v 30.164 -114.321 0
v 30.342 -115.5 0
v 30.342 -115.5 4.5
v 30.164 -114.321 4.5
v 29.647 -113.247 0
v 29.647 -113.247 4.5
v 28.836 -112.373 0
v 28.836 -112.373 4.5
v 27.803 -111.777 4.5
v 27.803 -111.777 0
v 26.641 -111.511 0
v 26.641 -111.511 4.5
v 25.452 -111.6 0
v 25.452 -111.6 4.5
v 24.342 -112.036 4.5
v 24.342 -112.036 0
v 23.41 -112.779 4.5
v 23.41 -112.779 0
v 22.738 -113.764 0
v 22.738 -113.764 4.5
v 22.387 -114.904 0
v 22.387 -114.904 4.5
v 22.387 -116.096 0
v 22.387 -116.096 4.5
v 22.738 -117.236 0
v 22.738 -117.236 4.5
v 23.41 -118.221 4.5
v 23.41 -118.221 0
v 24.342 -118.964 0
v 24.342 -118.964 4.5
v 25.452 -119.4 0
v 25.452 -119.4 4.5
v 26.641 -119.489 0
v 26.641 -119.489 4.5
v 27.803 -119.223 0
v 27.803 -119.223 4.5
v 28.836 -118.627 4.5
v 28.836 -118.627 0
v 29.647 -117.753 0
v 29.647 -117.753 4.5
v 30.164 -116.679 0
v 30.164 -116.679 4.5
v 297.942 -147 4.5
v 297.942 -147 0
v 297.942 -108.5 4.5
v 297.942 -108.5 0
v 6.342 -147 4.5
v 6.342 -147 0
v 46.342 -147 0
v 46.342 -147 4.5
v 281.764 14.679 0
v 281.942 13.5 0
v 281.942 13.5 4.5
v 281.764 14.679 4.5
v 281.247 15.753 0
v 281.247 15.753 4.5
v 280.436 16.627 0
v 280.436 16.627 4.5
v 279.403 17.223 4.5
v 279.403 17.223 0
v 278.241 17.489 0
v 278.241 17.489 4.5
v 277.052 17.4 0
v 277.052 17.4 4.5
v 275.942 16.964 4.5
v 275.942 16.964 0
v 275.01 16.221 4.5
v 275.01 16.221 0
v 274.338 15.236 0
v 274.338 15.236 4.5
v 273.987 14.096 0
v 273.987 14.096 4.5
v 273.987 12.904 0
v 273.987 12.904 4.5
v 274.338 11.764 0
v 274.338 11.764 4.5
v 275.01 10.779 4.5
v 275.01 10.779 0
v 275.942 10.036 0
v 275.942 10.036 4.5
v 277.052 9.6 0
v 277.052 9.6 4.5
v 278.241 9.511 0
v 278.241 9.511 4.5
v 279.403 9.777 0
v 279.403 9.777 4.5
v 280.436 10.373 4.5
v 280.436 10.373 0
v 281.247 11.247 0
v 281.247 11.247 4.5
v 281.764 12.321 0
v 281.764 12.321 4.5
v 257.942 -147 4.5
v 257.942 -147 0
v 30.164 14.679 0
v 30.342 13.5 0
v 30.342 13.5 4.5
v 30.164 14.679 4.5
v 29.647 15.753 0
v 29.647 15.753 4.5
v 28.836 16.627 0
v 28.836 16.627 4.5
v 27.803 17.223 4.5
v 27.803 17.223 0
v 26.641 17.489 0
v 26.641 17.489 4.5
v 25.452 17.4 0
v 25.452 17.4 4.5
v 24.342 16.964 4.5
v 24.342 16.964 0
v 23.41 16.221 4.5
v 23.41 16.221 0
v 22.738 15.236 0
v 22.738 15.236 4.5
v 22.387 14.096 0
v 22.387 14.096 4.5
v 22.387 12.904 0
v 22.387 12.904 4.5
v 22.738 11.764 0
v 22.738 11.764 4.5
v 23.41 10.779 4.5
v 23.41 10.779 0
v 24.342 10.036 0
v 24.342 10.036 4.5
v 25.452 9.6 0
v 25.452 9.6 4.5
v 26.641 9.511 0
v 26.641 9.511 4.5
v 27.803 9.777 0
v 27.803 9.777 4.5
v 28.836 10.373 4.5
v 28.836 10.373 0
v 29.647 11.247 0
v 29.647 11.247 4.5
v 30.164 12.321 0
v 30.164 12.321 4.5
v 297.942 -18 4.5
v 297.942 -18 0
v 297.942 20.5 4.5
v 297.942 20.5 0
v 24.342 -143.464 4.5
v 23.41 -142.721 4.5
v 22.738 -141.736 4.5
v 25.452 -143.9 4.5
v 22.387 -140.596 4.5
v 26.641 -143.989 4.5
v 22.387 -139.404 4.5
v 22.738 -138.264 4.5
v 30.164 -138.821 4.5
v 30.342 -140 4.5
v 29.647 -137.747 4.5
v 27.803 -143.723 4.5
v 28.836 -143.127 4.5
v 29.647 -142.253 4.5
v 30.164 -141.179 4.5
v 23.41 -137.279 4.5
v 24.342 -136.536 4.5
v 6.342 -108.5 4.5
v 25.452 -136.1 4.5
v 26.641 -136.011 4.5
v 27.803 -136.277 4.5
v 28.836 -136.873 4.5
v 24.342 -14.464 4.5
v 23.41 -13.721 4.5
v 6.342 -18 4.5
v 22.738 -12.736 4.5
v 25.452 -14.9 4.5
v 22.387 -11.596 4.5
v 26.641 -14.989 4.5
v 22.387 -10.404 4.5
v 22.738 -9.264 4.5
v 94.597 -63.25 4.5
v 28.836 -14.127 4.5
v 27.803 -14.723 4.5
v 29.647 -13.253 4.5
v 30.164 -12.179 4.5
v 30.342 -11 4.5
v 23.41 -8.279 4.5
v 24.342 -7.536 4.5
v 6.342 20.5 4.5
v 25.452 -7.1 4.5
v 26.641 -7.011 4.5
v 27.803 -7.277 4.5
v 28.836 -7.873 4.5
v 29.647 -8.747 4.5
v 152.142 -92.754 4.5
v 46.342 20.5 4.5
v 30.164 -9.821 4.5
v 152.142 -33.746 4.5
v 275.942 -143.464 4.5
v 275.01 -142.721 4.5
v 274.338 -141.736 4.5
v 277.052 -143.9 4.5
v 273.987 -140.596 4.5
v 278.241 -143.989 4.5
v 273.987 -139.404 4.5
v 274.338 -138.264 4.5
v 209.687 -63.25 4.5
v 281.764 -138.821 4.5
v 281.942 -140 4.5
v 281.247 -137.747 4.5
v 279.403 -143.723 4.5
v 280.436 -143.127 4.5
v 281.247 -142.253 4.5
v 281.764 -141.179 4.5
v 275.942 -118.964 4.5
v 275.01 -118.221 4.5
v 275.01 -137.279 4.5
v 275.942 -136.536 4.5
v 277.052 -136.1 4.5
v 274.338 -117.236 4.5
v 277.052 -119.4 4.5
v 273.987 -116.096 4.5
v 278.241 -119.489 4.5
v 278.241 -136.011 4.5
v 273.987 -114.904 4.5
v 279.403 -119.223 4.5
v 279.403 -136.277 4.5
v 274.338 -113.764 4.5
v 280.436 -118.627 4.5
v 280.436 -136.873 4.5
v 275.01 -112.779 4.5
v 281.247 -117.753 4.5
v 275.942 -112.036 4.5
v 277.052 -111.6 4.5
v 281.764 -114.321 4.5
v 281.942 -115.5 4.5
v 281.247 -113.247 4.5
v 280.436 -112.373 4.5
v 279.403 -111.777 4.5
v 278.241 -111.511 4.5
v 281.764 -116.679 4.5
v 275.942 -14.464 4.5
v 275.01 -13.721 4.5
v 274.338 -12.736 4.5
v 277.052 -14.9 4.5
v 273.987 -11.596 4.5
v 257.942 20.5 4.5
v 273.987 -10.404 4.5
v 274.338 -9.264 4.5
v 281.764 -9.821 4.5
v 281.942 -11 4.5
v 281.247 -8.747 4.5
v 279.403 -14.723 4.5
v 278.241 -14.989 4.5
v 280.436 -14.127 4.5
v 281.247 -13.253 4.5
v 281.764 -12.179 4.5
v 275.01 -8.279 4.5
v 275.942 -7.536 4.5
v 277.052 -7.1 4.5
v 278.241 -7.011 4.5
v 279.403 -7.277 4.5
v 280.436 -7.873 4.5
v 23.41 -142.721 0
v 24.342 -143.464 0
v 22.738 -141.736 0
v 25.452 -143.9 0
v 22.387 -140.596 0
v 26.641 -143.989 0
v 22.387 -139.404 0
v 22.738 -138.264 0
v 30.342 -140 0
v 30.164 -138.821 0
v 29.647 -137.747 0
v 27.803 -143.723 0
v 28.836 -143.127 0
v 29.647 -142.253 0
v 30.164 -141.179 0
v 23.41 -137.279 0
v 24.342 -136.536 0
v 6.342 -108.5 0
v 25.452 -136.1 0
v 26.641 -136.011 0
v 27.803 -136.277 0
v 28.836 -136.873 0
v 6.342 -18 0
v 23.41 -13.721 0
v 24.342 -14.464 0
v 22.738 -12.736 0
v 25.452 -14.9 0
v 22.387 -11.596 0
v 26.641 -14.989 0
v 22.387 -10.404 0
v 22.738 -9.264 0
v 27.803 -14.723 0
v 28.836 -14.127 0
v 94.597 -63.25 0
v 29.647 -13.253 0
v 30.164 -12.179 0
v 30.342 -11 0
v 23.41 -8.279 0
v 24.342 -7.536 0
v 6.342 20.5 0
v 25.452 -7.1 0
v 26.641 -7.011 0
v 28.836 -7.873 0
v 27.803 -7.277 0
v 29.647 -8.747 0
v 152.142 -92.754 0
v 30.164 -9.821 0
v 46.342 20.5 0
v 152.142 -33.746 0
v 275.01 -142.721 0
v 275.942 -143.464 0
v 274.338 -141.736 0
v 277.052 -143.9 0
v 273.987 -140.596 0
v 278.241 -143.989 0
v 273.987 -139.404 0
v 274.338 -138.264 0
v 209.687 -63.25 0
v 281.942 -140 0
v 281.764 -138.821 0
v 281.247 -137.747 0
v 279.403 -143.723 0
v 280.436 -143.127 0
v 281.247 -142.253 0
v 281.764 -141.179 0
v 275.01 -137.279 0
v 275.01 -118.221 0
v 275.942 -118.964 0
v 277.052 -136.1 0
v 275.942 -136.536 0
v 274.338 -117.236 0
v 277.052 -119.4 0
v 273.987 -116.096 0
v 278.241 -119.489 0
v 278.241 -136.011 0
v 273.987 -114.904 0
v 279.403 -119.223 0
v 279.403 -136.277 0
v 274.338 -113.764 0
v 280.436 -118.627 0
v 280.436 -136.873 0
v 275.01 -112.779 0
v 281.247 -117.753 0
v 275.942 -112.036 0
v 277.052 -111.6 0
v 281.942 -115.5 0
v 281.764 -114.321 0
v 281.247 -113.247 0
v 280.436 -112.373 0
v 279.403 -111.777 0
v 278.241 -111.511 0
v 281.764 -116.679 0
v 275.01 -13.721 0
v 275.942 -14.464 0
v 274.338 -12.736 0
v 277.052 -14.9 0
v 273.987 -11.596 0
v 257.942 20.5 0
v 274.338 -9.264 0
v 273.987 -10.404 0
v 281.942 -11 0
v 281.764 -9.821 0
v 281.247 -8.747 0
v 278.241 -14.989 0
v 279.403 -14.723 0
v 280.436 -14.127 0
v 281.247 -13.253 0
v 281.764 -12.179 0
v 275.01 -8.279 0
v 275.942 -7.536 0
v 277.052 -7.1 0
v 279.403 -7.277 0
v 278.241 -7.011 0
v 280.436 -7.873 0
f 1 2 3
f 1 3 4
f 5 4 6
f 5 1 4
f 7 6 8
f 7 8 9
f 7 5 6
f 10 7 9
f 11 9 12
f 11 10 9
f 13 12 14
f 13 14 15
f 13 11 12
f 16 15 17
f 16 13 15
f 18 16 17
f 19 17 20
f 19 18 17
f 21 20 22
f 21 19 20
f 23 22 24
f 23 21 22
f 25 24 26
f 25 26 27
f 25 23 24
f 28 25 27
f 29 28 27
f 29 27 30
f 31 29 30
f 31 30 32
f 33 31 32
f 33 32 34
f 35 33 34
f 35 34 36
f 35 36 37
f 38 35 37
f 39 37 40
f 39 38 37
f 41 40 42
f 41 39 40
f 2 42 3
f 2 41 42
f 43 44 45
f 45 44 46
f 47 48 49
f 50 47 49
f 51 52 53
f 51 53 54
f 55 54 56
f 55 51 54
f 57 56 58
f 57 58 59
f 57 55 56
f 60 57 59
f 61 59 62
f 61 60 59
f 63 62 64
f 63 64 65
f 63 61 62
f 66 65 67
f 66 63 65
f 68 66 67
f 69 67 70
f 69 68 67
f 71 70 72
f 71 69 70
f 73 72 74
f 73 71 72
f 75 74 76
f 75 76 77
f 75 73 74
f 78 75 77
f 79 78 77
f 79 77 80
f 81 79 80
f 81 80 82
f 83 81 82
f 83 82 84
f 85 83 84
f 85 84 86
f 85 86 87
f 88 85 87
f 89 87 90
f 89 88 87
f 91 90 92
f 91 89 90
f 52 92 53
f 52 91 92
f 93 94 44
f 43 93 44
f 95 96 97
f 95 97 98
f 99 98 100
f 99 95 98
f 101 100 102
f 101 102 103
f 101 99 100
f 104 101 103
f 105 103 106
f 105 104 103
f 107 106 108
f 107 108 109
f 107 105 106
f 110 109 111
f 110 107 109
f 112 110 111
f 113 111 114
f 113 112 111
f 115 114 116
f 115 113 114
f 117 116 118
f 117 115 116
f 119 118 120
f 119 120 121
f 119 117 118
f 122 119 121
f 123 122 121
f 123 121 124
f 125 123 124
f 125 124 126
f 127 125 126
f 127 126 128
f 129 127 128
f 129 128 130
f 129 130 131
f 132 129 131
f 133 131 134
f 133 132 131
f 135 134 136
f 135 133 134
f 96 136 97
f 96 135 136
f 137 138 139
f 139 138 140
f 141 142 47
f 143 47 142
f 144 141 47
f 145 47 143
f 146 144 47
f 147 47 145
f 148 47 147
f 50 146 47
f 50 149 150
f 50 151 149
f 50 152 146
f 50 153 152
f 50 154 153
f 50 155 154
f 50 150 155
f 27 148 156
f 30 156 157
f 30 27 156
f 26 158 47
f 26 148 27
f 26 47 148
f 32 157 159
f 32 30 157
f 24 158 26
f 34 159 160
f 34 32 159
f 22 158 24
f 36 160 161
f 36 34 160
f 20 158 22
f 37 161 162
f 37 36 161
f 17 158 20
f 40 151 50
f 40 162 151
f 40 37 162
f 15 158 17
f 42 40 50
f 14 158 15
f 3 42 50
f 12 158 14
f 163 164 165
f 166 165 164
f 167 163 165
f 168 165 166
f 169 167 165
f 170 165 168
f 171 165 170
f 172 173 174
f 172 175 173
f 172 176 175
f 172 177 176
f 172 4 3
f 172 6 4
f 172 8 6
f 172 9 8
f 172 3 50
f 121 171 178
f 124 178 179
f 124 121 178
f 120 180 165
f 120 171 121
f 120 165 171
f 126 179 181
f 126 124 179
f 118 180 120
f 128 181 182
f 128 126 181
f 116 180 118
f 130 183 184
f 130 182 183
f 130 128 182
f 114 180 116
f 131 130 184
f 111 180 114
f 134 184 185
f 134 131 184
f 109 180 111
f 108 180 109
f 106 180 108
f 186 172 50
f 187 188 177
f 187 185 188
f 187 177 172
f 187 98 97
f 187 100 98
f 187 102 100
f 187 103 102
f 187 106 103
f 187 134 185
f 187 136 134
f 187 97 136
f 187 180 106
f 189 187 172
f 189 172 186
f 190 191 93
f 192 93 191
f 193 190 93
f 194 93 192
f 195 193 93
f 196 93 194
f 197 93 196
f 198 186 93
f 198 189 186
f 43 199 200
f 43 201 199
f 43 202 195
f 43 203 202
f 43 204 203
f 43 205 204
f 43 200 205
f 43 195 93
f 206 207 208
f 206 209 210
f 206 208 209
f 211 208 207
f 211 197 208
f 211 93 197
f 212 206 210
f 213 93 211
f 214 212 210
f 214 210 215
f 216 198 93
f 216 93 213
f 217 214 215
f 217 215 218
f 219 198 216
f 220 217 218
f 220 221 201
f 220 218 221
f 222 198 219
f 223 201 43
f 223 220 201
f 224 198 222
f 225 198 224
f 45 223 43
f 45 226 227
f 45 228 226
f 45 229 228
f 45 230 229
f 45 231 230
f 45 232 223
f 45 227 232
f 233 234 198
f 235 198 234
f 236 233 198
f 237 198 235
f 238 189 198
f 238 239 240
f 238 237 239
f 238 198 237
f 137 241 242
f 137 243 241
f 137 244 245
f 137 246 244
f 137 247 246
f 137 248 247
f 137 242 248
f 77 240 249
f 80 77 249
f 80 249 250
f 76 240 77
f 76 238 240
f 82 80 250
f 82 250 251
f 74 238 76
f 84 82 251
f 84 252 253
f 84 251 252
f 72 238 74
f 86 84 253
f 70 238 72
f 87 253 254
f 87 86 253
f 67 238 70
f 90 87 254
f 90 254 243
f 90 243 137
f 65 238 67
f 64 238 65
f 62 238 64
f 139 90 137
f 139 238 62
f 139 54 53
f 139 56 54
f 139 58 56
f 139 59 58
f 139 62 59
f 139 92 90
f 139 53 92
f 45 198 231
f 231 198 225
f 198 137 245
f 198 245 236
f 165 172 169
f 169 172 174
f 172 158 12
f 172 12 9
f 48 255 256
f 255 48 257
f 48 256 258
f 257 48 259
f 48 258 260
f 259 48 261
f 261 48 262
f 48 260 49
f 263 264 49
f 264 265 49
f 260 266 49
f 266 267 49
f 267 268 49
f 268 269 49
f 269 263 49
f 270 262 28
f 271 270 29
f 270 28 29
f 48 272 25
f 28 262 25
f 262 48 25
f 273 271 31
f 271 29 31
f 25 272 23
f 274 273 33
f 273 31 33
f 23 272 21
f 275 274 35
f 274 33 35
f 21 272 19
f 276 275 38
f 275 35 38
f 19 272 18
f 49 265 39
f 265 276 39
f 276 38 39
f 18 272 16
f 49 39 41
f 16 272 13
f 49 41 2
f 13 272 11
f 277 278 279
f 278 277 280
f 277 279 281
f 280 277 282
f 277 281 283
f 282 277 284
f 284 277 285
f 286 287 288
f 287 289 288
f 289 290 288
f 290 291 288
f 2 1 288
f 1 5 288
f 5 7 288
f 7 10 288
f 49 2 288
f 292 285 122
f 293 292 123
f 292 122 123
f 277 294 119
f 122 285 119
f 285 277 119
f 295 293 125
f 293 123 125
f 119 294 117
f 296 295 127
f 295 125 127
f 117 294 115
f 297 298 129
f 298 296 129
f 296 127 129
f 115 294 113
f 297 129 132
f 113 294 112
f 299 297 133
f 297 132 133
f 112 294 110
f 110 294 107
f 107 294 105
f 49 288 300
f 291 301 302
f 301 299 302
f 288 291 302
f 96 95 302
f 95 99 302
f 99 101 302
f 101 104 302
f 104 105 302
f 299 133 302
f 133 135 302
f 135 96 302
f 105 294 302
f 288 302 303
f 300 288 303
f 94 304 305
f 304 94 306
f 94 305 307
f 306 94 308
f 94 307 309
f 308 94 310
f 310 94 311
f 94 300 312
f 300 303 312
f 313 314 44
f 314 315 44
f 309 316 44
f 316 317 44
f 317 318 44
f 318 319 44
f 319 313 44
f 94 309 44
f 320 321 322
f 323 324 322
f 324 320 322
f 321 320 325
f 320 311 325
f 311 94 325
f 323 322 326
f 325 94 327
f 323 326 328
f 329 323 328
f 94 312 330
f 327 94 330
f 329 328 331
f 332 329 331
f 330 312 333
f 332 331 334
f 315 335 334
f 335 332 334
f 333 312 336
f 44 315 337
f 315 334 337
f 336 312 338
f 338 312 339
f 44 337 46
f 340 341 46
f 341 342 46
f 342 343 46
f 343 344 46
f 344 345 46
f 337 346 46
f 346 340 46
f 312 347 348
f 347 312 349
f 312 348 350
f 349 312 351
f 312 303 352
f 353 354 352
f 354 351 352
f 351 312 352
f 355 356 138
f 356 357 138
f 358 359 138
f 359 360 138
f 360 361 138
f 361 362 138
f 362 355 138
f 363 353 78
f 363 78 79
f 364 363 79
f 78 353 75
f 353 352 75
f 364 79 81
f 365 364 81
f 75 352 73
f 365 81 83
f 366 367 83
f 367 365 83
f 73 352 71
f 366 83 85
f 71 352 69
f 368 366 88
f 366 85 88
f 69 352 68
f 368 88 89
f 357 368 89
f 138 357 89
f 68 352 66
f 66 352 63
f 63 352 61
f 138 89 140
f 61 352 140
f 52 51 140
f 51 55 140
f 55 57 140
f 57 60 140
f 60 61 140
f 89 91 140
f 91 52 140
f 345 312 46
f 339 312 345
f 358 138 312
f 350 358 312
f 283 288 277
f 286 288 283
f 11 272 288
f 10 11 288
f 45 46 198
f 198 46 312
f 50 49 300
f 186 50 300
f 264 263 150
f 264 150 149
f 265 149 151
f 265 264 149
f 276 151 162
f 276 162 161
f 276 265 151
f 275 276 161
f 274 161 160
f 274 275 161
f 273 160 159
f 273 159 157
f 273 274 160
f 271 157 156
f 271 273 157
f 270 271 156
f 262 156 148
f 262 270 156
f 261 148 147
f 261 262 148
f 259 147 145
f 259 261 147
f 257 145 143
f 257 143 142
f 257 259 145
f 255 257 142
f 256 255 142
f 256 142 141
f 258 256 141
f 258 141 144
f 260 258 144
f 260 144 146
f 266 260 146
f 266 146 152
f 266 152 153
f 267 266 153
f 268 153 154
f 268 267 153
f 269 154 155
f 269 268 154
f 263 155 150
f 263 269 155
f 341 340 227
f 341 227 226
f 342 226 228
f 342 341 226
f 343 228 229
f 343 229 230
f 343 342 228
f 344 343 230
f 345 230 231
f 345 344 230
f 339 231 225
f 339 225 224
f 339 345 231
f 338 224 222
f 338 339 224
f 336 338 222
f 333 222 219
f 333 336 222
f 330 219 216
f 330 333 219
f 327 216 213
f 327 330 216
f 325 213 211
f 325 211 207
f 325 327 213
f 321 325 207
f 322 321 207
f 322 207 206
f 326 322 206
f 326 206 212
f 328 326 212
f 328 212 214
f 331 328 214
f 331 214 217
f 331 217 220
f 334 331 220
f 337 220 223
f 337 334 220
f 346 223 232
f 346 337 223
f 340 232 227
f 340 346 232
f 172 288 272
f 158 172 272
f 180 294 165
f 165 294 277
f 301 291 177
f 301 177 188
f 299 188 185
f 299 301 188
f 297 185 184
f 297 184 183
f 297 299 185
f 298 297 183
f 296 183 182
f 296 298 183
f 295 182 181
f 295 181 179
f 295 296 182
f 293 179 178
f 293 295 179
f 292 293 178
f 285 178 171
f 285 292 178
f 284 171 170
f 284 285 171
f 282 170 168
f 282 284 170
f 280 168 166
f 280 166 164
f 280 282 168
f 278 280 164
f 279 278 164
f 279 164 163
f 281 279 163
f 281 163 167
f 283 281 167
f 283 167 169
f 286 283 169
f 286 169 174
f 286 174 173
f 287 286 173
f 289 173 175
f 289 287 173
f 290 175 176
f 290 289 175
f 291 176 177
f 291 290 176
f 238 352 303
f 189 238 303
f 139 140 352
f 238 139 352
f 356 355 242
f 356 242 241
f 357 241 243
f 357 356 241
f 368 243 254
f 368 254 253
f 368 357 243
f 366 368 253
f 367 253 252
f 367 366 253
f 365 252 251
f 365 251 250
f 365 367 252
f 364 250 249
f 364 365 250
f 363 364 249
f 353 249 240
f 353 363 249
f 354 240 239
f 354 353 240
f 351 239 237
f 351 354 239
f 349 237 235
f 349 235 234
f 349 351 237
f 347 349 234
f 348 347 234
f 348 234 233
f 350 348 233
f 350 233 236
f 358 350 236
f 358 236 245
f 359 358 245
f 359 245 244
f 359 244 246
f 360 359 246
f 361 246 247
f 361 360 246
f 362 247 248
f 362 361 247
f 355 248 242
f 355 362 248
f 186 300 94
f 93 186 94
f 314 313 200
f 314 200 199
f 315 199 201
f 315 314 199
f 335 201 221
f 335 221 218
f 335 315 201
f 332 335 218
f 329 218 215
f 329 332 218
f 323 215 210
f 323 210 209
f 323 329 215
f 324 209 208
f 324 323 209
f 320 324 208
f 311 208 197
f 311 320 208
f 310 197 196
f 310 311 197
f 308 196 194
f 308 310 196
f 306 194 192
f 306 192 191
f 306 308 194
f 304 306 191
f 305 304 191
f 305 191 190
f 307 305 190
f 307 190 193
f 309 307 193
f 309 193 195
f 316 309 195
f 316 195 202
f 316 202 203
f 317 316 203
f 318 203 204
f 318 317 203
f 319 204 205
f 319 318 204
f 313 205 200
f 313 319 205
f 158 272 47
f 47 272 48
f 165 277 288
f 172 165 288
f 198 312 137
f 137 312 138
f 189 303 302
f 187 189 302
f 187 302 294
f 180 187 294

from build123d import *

# Parameters (mm, degrees)
SKETCH1_R           = 4
BOSS_EXTRUDE1_DEPTH = 4.5


with BuildPart() as part:
    # Sketch1 → Boss-Extrude1 (new body)
    with BuildSketch(Plane.XY):
        Polygon((152.142010442, -92.754372019), (94.597049202, -63.25), (6.342010442, -108.5), (6.342010442, -147), (46.342010442, -147), align=None)
        with Locations((26.342010442, -140)):
            Circle(SKETCH1_R, mode=Mode.SUBTRACT)
        with Locations((26.342010442, -115.5)):
            Circle(SKETCH1_R, mode=Mode.SUBTRACT)
        Polygon((152.142010442, -33.745627981), (94.597049202, -63.25), (152.142010442, -92.754372019), (209.686971683, -63.25), align=None)
        Polygon((6.342010442, 20.5), (6.342010442, -18), (94.597049202, -63.25), (152.142010442, -33.745627981), (46.342010442, 20.5), align=None)
        with Locations((26.342010442, -11)):
            Circle(SKETCH1_R, mode=Mode.SUBTRACT)
        with Locations((26.342010442, 13.5)):
            Circle(SKETCH1_R, mode=Mode.SUBTRACT)
        Polygon((257.942010442, 20.5), (152.142010442, -33.745627981), (209.686971683, -63.25), (297.942010442, -18), (297.942010442, 20.5), align=None)
        with Locations((277.942010442, -11)):
            Circle(SKETCH1_R, mode=Mode.SUBTRACT)
        with Locations((277.942010442, 13.5)):
            Circle(SKETCH1_R, mode=Mode.SUBTRACT)
        Polygon((209.686971683, -63.25), (152.142010442, -92.754372019), (257.942010442, -147), (297.942010442, -147), (297.942010442, -108.5), align=None)
        with Locations((277.942010442, -140)):
            Circle(SKETCH1_R, mode=Mode.SUBTRACT)
        with Locations((277.942010442, -115.5)):
            Circle(SKETCH1_R, mode=Mode.SUBTRACT)
    extrude(amount=BOSS_EXTRUDE1_DEPTH)


solid = part.part
